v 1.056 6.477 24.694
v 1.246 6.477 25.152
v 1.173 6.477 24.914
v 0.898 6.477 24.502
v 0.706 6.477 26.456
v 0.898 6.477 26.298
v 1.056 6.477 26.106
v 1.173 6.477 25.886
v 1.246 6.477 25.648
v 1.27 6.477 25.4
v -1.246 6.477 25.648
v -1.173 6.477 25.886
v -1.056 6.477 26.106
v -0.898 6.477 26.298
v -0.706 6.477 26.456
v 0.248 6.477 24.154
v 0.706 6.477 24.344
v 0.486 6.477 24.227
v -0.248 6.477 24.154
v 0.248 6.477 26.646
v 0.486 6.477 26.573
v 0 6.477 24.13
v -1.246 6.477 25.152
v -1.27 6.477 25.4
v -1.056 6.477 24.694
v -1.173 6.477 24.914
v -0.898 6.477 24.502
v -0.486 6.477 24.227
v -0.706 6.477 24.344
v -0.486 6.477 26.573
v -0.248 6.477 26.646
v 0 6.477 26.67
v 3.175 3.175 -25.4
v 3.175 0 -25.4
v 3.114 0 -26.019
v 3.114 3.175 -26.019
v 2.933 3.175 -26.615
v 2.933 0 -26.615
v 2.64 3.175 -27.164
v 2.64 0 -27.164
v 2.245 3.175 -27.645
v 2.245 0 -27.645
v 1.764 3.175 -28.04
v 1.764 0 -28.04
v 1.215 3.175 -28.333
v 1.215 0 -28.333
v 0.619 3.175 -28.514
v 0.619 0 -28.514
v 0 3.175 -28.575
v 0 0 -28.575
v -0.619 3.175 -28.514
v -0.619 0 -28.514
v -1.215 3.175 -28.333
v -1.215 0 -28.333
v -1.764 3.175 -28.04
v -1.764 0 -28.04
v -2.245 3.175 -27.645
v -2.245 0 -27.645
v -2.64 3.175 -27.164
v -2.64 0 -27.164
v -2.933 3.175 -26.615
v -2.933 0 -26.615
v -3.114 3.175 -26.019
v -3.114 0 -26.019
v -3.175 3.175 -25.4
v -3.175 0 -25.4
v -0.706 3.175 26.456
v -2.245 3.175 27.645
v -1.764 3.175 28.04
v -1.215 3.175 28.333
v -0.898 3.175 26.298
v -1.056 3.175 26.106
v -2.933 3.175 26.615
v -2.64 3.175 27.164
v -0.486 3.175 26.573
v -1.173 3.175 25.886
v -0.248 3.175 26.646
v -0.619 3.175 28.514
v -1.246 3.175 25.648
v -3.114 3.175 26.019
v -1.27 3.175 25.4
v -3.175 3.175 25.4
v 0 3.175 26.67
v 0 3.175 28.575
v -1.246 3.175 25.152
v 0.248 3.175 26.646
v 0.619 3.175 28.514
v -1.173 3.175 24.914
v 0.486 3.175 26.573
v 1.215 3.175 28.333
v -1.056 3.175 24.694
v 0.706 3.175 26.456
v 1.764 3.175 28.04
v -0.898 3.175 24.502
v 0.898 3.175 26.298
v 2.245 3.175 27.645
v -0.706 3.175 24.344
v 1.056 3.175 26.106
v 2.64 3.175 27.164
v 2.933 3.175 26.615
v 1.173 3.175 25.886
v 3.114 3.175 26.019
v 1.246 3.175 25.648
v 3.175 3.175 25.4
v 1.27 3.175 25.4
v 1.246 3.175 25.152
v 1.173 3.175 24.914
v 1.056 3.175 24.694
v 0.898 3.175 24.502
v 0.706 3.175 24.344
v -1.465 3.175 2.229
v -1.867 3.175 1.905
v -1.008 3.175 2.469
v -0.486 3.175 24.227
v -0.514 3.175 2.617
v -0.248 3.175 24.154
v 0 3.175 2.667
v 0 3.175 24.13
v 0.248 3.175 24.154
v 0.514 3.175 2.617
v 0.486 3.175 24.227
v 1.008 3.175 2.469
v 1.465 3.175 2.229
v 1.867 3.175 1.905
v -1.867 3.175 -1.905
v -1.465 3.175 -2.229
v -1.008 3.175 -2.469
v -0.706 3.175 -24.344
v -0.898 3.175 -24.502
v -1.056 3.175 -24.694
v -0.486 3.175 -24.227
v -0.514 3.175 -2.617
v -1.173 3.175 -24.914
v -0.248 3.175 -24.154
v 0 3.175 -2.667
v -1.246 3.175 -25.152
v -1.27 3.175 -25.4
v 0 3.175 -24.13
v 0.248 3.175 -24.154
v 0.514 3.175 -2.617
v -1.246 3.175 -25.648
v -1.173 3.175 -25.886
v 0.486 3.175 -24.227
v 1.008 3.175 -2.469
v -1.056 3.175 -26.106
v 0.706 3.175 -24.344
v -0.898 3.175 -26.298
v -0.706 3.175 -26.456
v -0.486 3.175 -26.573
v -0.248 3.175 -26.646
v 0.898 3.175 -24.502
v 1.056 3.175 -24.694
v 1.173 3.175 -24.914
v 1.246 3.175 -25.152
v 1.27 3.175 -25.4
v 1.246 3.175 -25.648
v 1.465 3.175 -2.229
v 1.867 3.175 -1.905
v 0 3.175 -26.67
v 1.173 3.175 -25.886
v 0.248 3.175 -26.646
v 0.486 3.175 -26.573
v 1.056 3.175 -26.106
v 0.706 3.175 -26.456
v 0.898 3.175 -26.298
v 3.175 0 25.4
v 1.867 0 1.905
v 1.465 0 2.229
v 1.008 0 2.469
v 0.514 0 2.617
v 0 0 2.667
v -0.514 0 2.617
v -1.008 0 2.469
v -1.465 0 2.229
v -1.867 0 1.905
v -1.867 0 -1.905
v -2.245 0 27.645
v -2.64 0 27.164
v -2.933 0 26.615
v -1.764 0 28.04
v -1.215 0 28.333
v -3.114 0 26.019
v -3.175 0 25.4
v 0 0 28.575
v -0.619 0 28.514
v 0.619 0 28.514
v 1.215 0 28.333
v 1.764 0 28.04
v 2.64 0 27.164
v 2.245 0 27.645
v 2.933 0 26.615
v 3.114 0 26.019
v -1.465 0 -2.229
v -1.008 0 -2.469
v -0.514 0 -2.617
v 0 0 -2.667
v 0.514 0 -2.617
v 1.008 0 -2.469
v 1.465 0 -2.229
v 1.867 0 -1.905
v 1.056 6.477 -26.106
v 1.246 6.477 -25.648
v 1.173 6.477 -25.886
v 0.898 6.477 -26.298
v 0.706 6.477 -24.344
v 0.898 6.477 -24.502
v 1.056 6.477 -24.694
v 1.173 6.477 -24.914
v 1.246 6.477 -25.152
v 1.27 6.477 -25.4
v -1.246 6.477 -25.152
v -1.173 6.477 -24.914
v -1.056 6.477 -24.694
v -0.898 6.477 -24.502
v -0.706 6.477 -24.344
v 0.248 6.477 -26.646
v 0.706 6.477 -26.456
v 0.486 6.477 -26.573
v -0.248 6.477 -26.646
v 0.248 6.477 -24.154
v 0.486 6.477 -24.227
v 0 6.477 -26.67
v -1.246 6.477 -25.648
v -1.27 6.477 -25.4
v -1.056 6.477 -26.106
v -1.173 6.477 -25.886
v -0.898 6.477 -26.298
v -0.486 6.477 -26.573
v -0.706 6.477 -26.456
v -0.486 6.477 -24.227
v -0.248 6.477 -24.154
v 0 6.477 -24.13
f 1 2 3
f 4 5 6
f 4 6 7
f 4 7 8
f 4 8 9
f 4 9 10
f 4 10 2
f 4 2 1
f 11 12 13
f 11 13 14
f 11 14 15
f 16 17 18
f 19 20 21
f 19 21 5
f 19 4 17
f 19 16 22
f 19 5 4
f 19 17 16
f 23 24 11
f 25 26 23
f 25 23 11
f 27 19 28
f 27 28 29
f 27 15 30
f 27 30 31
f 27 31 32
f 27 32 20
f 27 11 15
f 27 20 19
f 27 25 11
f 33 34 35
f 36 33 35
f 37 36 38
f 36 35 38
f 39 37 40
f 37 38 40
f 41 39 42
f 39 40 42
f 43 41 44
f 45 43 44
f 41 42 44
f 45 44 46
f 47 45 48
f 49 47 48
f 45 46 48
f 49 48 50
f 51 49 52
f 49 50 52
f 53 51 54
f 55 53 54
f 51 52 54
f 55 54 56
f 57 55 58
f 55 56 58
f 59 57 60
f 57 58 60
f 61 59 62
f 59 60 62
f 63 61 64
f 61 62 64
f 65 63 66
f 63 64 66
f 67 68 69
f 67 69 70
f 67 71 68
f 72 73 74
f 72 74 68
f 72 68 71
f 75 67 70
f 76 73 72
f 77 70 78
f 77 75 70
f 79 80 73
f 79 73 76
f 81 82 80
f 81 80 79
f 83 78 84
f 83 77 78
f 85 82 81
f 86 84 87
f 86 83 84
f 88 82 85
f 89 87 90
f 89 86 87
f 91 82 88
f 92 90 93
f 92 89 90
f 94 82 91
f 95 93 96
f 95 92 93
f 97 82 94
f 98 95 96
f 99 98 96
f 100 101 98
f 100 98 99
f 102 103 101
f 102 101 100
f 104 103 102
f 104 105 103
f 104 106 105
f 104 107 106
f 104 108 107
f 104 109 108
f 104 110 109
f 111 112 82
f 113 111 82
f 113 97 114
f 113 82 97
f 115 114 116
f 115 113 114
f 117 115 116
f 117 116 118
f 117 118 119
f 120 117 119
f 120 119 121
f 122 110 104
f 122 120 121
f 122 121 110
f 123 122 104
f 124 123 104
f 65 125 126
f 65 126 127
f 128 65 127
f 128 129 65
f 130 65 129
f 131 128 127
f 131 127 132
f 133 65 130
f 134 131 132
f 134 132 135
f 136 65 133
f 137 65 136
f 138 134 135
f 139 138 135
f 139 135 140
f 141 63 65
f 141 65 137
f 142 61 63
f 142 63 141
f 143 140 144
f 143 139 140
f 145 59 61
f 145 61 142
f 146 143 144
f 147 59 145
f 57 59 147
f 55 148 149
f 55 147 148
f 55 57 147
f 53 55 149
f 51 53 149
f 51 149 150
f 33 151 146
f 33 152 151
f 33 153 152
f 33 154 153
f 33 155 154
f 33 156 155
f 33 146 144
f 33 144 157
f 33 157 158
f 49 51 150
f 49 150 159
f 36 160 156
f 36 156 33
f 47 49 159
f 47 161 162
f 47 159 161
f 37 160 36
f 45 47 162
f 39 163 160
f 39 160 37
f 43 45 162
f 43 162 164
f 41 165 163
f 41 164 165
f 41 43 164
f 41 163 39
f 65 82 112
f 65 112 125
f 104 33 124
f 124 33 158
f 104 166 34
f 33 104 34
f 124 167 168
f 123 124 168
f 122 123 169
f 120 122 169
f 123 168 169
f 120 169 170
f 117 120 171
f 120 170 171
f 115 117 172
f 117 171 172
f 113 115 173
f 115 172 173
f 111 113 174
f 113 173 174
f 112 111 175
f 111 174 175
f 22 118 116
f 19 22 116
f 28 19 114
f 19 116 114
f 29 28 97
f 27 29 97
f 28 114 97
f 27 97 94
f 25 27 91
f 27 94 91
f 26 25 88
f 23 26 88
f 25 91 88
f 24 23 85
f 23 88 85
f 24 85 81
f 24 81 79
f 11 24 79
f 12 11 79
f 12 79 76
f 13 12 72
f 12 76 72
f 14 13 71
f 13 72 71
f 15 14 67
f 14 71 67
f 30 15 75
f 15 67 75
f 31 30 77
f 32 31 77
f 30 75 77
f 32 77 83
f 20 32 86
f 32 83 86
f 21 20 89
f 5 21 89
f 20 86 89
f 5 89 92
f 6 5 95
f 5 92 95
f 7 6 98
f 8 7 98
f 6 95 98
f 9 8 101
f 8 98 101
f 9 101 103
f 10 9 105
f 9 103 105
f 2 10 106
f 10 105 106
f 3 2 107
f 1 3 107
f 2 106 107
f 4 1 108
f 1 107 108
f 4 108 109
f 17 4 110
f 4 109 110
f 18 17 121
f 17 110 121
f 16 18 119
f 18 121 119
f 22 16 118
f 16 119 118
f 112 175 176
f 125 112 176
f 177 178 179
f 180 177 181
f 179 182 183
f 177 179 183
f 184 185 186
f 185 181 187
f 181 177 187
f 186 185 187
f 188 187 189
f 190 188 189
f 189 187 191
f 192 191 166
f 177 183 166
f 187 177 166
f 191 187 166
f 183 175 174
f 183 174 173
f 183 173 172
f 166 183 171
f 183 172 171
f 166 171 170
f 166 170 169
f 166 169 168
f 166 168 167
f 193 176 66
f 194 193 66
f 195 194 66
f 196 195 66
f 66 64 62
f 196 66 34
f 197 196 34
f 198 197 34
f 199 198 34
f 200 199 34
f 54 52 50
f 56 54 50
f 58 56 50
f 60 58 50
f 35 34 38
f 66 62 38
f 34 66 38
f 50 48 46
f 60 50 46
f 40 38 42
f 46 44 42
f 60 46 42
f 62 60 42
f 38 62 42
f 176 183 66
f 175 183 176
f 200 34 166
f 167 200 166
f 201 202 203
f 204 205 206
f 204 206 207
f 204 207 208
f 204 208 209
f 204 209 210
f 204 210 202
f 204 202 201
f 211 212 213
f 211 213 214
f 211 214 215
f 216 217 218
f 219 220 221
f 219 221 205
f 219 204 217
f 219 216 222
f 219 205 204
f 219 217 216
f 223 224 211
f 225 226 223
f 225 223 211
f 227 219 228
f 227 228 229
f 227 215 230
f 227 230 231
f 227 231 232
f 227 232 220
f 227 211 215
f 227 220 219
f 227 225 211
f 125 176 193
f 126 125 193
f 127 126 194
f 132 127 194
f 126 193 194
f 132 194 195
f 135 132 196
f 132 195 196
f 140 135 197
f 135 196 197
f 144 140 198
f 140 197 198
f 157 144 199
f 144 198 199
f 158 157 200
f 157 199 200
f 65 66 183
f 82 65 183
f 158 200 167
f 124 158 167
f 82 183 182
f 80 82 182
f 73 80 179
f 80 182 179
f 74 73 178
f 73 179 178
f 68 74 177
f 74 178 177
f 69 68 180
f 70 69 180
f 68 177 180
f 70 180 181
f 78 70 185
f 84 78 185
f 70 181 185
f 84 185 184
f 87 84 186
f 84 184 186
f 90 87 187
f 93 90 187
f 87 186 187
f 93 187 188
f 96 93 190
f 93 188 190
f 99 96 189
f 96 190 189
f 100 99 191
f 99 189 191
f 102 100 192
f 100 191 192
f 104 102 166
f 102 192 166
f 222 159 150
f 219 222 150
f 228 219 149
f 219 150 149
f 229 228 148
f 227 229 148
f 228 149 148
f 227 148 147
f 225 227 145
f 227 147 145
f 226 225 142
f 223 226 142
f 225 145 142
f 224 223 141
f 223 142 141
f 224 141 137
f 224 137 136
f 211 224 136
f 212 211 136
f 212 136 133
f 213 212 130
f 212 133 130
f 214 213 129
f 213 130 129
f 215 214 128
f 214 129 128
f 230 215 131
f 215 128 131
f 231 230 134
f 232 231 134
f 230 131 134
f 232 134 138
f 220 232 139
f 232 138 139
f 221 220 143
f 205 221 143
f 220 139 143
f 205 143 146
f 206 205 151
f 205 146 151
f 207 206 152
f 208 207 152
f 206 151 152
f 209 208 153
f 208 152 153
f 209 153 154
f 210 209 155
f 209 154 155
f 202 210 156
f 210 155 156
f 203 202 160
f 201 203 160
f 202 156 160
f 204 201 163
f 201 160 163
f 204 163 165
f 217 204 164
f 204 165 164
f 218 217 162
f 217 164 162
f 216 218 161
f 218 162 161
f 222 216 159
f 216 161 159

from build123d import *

# Parameters (mm, degrees)
BOSS_EXTRUDE5_DEPTH = 3.175
SKETCH8_R           = 1.27
BOSS_EXTRUDE6_DEPTH = 3.302
CUT_EXTRUDE3_DEPTH  = 30.47138916


with BuildPart() as part:
    # Sketch7 → Boss-Extrude5 (new body)
    with BuildSketch(Plane(origin=(0, 0, 0), x_dir=(1, 0, 0), z_dir=(0, 1, 0))):
        with BuildLine():
            Line((-3.175, 25.4), (-3.175, -25.4))
            ThreePointArc((-3.175, -25.4), (0, -28.575), (3.175, -25.4))
            Line((3.175, -25.4), (3.175, 25.4))
            ThreePointArc((3.175, 25.4), (0, 28.575), (-3.175, 25.4))
        make_face()
    extrude(amount=BOSS_EXTRUDE5_DEPTH)

    # Sketch8 → Boss-Extrude6 (add)
    with BuildSketch(Plane(origin=(0, 3.175, 0), x_dir=(1, 0, 0), z_dir=(0, 1, 0))):
        with Locations(Location((0, 25.4, 0), (0, 0, 90))):
            Circle(SKETCH8_R)
        with Locations(Location((0, -25.4, 0), (0, 0, 90))):
            Circle(SKETCH8_R)
    extrude(amount=BOSS_EXTRUDE6_DEPTH)

    # Sketch9 → Cut-Extrude3 (cut, through all)
    with BuildSketch(Plane.XZ):
        with BuildLine():
            Line((-1.866511184, 1.905), (-1.866511184, -1.905))
            ThreePointArc((-1.866511184, -1.905), (0, -2.667), (1.866511184, -1.905))
            Line((1.866511184, -1.905), (1.866511184, 1.905))
            ThreePointArc((1.866511184, 1.905), (0, 2.667), (-1.866511184, 1.905))
        make_face()
    extrude(amount=-CUT_EXTRUDE3_DEPTH, mode=Mode.SUBTRACT)


solid = part.part
